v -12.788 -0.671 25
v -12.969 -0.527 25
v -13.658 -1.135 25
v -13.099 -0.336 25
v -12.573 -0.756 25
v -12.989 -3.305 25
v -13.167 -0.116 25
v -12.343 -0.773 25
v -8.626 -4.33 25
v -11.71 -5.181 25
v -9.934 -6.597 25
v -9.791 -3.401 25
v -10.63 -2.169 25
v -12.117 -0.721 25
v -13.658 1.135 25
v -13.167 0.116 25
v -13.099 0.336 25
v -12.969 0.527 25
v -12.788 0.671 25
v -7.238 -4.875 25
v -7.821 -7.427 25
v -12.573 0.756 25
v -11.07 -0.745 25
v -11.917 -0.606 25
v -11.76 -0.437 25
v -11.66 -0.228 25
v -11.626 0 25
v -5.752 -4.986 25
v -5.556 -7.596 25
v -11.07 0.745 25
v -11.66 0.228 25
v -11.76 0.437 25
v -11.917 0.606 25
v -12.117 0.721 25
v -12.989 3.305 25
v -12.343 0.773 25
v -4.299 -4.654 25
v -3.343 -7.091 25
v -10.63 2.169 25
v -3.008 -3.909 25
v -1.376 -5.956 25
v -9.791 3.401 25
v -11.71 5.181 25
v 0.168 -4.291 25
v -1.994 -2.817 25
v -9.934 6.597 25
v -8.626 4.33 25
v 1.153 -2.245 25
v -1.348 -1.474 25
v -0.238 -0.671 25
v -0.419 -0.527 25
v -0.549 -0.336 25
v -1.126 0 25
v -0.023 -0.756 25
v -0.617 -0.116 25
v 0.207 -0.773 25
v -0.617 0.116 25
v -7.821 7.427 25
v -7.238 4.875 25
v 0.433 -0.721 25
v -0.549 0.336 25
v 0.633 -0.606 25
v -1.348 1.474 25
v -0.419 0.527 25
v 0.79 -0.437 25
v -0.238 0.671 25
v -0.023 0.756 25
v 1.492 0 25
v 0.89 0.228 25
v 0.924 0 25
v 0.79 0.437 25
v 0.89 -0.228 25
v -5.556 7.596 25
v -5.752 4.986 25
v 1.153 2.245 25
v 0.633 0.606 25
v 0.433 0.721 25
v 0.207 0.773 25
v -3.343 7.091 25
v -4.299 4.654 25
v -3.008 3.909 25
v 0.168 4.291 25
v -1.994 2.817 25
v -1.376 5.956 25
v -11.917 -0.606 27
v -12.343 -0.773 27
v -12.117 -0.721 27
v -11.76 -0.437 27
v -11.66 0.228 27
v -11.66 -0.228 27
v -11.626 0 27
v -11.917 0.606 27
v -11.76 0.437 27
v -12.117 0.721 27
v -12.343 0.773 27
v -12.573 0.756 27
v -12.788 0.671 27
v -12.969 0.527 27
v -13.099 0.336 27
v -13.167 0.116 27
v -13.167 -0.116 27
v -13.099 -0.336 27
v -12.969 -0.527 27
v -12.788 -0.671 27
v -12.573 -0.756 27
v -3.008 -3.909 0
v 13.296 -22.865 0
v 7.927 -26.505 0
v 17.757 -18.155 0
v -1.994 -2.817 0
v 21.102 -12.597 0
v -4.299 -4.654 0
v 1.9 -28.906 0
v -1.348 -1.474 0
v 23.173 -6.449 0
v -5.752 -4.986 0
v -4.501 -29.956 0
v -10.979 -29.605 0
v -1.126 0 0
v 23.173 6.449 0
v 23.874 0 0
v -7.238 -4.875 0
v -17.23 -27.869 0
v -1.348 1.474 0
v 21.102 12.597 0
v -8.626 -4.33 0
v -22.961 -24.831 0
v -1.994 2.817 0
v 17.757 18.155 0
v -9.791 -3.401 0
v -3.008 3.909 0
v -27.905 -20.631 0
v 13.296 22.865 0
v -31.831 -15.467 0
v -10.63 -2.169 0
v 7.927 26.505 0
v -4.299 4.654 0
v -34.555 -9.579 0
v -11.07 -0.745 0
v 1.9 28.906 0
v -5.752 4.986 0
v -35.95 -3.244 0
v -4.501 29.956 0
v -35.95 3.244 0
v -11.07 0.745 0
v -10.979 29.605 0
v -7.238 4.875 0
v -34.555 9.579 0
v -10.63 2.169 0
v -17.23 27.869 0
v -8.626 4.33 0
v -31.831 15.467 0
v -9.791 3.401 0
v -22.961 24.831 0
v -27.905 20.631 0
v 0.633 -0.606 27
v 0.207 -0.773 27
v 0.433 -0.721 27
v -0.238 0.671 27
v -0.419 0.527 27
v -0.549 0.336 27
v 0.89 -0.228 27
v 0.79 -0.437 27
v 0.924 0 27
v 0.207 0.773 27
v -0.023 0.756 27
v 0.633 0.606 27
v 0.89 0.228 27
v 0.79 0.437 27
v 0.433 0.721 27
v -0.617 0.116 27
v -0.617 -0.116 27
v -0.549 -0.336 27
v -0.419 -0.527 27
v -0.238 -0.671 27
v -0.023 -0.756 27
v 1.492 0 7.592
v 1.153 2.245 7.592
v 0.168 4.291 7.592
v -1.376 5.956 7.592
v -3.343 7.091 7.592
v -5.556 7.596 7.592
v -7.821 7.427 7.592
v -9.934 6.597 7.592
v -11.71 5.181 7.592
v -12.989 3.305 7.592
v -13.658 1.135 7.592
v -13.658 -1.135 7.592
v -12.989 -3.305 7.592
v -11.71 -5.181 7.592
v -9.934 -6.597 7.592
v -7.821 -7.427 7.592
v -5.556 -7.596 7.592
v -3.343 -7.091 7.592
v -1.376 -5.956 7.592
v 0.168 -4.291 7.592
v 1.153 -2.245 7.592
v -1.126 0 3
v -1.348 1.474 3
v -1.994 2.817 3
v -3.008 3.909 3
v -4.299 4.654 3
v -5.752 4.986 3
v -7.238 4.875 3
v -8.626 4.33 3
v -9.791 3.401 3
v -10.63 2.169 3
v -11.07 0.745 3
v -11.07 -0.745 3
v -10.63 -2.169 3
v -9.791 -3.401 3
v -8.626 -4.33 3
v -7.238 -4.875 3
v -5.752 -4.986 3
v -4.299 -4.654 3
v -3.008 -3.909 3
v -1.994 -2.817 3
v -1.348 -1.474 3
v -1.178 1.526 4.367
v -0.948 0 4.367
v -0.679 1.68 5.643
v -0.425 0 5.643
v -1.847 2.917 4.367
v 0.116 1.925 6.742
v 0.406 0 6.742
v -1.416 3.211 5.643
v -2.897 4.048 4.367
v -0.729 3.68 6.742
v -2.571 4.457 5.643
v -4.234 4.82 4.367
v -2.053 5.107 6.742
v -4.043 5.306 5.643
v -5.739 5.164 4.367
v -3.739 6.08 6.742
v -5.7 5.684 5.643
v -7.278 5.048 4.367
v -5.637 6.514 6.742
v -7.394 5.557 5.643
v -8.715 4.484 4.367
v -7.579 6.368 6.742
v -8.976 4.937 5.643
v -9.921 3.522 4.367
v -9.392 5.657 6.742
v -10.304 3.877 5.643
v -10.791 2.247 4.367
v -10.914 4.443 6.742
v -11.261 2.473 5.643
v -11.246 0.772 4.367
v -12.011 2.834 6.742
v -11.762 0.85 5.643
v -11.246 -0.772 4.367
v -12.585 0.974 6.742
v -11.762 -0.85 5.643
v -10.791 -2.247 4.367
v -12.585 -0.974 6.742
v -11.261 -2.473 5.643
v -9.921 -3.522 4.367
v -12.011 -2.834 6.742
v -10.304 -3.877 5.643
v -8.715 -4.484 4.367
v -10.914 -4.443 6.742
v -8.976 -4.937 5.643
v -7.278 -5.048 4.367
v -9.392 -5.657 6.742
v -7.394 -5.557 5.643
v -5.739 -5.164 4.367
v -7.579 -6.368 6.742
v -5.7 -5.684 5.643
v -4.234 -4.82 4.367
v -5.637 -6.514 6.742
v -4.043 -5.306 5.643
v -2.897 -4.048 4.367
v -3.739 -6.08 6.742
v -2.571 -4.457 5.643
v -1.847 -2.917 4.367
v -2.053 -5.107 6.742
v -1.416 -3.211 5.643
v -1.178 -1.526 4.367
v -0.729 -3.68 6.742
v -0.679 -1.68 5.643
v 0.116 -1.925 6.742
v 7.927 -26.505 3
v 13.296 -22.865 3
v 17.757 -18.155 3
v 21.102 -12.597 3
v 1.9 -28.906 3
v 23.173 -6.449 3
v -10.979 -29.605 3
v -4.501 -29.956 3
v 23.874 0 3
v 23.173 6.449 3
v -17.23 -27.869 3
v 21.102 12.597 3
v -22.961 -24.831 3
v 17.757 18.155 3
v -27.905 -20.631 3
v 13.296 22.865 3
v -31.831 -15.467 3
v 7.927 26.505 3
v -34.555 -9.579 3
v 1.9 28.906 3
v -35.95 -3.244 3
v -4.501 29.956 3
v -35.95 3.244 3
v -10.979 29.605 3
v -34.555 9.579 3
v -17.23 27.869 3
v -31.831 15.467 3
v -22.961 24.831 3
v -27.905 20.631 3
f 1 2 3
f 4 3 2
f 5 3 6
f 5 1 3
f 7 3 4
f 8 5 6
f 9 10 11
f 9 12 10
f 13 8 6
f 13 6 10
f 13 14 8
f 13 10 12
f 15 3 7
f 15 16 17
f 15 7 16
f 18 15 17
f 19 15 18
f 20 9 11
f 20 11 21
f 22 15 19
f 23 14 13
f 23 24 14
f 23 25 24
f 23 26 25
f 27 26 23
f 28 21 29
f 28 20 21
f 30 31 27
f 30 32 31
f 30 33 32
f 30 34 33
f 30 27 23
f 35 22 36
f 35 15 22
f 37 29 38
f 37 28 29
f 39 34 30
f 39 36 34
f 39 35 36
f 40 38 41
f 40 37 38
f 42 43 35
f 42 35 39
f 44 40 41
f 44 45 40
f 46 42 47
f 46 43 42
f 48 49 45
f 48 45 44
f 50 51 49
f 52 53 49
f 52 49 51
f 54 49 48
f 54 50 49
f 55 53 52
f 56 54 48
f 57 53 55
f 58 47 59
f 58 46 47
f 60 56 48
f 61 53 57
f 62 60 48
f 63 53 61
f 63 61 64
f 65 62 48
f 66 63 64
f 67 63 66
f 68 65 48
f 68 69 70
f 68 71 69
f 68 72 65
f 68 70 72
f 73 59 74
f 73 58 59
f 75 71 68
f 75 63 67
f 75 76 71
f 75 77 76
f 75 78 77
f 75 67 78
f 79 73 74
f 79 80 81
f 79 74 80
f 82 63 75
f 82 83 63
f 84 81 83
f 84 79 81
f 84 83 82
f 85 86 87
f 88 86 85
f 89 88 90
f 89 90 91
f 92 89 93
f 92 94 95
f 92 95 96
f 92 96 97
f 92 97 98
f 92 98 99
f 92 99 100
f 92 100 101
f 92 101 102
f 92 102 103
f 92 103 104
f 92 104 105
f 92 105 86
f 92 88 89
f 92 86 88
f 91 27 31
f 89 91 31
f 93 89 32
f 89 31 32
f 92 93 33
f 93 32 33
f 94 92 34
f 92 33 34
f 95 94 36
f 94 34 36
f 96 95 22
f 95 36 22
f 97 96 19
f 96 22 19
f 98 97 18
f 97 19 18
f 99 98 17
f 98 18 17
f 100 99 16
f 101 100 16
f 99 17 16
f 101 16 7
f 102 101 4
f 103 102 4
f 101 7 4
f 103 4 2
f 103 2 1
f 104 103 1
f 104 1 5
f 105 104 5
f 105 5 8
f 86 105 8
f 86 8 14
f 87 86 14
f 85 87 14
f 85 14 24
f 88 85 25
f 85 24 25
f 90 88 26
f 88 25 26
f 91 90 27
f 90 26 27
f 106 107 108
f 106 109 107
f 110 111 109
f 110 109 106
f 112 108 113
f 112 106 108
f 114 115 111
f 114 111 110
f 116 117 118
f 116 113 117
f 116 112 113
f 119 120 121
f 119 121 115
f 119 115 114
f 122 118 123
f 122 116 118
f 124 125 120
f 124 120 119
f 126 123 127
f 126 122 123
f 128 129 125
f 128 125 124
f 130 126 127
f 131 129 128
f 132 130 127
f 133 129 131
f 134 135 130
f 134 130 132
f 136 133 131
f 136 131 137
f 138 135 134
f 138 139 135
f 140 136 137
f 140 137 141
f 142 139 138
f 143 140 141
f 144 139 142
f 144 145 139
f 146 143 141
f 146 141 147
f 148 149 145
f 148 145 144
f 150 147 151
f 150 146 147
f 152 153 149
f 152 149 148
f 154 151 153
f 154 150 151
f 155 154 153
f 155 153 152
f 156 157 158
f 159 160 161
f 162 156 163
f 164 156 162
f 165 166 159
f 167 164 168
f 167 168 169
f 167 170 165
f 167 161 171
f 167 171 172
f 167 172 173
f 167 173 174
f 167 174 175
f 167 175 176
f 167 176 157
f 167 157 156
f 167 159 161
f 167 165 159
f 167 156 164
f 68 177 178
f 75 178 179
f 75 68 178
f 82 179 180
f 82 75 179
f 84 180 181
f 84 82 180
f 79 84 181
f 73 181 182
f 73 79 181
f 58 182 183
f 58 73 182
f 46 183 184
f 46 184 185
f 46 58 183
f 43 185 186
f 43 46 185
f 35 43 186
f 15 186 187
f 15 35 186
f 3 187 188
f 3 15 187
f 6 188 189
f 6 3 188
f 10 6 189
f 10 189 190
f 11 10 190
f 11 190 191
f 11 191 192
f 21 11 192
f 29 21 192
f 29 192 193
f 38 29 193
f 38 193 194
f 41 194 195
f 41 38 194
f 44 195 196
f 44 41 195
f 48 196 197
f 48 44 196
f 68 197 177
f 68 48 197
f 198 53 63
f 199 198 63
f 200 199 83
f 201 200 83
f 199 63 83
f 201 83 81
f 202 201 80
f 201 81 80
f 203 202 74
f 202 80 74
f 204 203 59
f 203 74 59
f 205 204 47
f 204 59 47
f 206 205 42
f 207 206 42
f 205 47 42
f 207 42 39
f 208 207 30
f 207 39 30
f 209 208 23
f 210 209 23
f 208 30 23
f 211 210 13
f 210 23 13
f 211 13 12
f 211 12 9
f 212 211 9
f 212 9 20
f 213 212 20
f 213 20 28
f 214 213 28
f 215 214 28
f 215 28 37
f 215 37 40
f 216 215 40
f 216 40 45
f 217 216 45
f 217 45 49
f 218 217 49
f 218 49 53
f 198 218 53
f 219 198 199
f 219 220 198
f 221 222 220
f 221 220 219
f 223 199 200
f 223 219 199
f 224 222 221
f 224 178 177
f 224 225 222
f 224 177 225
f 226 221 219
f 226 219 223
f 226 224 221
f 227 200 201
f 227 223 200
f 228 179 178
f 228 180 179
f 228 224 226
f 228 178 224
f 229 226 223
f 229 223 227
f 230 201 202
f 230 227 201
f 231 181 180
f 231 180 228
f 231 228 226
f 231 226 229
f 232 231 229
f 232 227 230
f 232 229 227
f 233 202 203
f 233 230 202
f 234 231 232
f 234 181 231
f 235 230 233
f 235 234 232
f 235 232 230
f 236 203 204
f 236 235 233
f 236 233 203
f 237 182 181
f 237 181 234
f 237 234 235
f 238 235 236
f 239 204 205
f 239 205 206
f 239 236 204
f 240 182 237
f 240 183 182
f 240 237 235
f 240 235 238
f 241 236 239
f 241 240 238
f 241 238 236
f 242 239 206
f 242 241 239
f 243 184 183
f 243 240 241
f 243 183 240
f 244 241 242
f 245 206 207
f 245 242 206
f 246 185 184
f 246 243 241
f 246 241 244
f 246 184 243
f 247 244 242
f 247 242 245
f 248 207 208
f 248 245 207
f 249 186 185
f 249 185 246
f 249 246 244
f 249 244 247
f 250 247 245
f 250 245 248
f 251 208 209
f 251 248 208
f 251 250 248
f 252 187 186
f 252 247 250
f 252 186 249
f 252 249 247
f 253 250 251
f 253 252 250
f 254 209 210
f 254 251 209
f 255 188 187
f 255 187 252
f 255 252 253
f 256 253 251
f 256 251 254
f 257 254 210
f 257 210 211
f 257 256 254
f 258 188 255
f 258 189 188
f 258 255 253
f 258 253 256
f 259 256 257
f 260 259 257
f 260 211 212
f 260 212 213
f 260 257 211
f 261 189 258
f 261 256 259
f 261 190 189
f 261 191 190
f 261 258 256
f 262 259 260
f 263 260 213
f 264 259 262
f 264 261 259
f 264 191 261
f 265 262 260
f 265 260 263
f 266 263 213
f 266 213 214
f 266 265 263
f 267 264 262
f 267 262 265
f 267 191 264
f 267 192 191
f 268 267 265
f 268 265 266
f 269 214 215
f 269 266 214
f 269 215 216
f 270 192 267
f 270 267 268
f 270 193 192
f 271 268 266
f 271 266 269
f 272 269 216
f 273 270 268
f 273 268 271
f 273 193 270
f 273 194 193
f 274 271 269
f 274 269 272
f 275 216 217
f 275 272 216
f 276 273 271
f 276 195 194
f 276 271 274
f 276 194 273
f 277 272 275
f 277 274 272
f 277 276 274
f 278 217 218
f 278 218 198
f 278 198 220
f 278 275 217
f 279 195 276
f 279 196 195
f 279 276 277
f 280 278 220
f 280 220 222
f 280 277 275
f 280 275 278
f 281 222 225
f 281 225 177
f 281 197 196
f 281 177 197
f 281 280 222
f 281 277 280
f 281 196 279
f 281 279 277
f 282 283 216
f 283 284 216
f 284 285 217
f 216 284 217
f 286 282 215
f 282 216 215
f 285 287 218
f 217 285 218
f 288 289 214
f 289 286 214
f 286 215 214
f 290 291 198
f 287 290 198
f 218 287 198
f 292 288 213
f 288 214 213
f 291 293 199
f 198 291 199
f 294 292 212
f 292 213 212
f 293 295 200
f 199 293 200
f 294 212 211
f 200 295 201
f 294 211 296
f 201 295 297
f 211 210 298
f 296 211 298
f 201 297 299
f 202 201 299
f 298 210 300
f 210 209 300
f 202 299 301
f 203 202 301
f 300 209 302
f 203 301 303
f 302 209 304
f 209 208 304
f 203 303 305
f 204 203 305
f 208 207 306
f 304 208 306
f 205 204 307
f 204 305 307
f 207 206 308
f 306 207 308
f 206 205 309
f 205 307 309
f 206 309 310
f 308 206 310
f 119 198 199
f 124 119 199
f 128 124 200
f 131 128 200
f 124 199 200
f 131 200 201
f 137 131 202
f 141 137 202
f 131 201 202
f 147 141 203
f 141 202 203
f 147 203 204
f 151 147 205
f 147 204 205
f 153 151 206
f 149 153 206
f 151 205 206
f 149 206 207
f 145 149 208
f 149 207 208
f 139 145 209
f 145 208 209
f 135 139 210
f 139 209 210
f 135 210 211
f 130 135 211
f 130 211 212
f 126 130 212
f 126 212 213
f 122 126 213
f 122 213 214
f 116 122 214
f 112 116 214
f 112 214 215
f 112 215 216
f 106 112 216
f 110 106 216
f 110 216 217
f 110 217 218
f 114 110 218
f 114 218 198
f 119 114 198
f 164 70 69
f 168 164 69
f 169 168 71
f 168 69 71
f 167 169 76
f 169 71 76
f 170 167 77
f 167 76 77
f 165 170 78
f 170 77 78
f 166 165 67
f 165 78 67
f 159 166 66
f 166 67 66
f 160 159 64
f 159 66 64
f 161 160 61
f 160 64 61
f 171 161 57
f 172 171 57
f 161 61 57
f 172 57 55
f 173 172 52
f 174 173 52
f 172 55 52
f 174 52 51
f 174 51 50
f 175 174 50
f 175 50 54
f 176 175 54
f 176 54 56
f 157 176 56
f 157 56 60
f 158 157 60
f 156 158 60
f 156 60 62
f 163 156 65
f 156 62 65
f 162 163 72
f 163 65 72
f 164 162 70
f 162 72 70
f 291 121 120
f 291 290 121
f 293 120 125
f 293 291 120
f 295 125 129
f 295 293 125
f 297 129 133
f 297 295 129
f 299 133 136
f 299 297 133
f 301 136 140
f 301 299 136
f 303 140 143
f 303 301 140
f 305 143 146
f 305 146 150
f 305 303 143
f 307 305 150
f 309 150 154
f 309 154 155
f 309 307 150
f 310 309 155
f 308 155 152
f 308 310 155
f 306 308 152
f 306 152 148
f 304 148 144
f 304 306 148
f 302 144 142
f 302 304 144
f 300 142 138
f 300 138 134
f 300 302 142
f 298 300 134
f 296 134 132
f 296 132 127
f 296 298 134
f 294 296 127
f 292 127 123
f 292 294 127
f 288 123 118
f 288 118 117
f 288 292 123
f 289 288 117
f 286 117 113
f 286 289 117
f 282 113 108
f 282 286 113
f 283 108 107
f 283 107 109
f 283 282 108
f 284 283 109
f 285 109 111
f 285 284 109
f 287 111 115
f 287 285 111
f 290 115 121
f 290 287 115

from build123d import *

# Parameters (mm, degrees)
F0_W     = 25
F0_H     = 3
F2_R     = 5
F3_DEPTH = 34.4
F4_R     = 0.775
F5_DEPTH = 2


with BuildPart() as f1:
    # F0 (on Front) → F1 (revolve)
    with BuildSketch(Plane.XZ):
        with Locations((11.374407, 1.5)):
            Rectangle(F0_W, F0_H)
        with BuildLine():
            Line((-1.125593, 25), (-1.125593, 3))
            ThreePointArc((-1.125593, 3), (-0.425256, 5.642617), (1.491917, 7.591552))
            Line((1.491917, 7.591552), (1.491917, 25))
            Line((1.491917, 25), (-1.125593, 25))
        make_face()
        Polygon((-6.125593, 0), (-1.125593, 0), (-1.125593, 3), (-1.125593, 25), (-6.125593, 25), align=None)
    revolve(axis=Axis((-6.125593, 0, 12.5), (0, 0, 1)))

    # F2 (on face) → F3 (cut)
    with BuildSketch(Plane.XY.offset(25)):
        with Locations((-6.125593, 0)):
            Circle(F2_R)
    extrude(amount=-F3_DEPTH, mode=Mode.SUBTRACT)

    # F4 (on face) → F5 (join)
    with BuildSketch(Plane.XY.offset(25)):
        with Locations((-12.400593, 0)):
            Circle(F4_R)
        with Locations((0.149407, 0)):
            Circle(F4_R)
    extrude(amount=F5_DEPTH)


solid = f1.part
